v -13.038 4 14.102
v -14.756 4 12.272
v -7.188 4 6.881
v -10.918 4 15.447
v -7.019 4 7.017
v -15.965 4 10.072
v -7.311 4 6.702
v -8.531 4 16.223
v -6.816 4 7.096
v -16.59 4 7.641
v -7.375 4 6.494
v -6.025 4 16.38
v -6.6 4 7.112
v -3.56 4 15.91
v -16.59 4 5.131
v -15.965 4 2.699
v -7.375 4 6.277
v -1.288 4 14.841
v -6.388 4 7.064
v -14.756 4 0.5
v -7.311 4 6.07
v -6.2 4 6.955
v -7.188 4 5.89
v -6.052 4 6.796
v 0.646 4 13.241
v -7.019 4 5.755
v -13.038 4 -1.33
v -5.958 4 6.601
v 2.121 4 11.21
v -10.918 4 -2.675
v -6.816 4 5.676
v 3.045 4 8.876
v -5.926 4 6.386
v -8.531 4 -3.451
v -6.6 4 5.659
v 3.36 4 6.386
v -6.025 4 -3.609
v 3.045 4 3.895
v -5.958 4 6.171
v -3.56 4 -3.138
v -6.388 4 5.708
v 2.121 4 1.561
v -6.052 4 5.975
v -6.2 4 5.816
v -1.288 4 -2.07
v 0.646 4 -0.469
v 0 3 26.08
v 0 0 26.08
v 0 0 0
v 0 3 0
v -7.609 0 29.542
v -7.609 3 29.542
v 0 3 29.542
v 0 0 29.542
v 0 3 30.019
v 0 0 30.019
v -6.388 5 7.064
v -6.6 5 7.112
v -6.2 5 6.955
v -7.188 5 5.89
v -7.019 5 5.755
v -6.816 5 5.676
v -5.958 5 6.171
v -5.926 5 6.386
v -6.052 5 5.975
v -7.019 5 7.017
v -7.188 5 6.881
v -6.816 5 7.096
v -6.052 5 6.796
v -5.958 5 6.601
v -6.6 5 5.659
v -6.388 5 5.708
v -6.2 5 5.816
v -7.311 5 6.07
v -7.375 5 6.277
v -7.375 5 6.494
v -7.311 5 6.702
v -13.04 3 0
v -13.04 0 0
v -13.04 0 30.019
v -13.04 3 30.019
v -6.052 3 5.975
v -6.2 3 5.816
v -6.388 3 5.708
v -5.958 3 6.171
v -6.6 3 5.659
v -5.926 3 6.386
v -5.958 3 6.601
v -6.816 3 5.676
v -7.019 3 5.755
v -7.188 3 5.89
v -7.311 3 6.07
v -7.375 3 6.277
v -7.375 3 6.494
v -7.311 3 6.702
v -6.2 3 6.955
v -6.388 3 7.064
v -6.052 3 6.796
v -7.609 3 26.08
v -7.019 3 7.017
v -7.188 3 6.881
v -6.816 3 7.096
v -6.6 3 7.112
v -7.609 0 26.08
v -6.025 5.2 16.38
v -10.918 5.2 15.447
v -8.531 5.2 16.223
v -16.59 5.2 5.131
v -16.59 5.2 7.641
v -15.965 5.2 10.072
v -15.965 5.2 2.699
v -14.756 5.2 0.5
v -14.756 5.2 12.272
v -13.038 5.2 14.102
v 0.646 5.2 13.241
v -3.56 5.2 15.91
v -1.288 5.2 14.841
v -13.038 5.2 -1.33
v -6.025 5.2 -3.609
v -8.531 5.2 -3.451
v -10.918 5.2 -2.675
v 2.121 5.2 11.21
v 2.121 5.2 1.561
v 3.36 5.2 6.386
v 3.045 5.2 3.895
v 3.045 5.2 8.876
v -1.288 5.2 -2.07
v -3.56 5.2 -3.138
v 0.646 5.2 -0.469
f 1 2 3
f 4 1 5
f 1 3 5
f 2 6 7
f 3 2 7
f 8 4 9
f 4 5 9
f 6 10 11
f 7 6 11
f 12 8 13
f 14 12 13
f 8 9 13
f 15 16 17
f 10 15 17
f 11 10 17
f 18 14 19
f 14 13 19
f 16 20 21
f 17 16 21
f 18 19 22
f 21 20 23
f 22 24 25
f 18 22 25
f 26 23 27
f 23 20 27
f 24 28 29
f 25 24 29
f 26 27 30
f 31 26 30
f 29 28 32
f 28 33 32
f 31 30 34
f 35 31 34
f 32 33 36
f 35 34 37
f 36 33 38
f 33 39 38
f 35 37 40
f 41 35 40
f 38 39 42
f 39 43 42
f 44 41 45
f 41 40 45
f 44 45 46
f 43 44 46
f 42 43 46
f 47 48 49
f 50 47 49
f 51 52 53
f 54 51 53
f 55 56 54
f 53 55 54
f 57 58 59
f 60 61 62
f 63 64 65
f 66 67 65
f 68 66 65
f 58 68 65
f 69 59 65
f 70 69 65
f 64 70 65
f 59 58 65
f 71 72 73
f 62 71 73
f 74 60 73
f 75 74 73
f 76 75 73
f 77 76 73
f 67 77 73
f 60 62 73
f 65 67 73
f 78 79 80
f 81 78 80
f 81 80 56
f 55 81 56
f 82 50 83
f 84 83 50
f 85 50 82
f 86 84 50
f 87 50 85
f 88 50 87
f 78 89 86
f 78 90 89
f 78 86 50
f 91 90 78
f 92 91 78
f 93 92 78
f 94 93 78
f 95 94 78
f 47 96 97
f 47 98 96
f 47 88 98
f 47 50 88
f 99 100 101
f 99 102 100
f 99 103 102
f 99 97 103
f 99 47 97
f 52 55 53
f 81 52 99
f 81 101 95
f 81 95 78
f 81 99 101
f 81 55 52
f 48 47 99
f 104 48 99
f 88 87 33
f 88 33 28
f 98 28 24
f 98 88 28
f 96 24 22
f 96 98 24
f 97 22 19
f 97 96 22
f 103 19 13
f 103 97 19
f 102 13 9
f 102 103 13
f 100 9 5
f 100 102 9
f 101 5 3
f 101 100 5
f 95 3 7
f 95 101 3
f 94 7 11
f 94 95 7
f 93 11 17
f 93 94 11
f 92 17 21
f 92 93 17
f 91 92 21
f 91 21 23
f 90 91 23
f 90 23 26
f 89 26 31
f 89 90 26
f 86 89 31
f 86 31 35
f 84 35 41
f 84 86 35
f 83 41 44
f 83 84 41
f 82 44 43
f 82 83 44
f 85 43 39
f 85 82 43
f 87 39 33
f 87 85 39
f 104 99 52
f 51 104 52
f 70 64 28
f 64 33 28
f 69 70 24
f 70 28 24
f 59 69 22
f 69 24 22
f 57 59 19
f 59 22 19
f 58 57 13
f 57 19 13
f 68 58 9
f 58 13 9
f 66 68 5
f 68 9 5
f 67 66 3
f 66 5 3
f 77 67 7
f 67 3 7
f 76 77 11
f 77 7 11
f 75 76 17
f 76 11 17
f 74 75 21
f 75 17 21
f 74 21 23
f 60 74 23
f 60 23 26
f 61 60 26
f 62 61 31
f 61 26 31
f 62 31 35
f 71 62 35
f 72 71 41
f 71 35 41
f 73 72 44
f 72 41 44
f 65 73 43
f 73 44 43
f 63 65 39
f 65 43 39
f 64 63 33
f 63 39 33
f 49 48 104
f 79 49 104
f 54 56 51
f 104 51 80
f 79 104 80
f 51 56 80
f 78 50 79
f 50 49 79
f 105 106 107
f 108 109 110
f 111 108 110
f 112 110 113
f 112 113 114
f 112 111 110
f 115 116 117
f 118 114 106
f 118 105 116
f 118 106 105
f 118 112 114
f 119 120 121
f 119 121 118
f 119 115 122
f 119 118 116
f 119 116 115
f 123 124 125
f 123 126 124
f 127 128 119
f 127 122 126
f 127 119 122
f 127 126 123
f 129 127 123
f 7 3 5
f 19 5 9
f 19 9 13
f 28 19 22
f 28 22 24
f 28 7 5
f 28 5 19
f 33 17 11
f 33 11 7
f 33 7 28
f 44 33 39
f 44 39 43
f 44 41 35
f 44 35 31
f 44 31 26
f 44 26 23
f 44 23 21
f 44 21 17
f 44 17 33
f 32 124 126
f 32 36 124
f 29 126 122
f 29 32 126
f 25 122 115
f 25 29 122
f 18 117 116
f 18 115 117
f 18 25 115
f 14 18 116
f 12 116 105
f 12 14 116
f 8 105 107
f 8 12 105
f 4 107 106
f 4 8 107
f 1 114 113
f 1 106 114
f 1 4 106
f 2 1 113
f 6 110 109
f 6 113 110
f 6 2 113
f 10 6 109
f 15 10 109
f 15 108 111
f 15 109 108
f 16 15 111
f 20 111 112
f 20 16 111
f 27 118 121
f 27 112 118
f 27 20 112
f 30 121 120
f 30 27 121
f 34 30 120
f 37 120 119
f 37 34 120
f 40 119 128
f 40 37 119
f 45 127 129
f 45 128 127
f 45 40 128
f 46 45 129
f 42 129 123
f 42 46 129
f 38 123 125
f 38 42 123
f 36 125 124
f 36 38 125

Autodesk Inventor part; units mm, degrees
ref_plane "YZ Plane" through (0, 0, 0) normal (1, 0, 0) x (0, 1, 0)
ref_plane "XZ Plane" through (0, 0, 0) normal (0, 1, 0) x (-1, 0, 0)
ref_plane "XY Plane" through (0, 0, 0) normal (0, 0, 1) x (1, 0, 0)
sketch "Sketch1" plane through (0, 0, 0) normal (0, 1, 0) x (-1, 0, 0)
  line L0 (0, 0) -> (13.0401, 0)
  line L1 (13.0401, 0) -> (13.0401, 30.019)
  line L2 (13.0401, 30.019) -> (0, 30.019)
  line L3 (0, 30.019) -> (0, 0)
extrude "Extrusion1" add sketch "Sketch1" along normal blind 3
sketch "Sketch2" plane through (0, 3, 0) normal (0, 1, 0) x (1, 0, 0)
  circle A0 centre (-6.6543, -6.3858) radius 0.7285
  point P0 (0, 0)
extrude "Extrusion2" add sketch "Sketch2" along normal blind 1
sketch "Sketch3" plane through (-6.6543, 4, 6.3858) normal (0, 1, 0) x (1, 0, 0)
  point P0 (6.6543, 6.3858)
sketch "Sketch4" plane through (-6.6543, 4, 6.3858) normal (0, 1, 0) x (1, 0, 0)
  circle A0 centre (0, 0) radius 0.7285 projected
  circle A1 centre (0, 0) radius 10.0143
  point P0 (6.6543, 6.3858)
extrude "Extrusion3" add sketch "Sketch4" along normal blind 1
sketch "Sketch5" plane through (0, 0, 30.019) normal (1, 0, 0) x (0, 0, -1)
  point P0 (30.019, 0)
sketch "Sketch6" plane through (0, 3, 0) normal (0, 1, 0) x (1, 0, 0)
  line L0 (0, -30.019) -> (0, 0) projected
  line L1 (0, -28.1093) -> (-7.3705, -28.1093)
  line L2 (-7.3705, -28.1093) -> (-7.3705, -24.1704)
  line L3 (-7.3705, -24.1704) -> (0, -24.1704)
  line L4 (0, -24.1704) -> (0, -28.1093)
extrude "Extrusion4" add sketch "Sketch6" against normal blind 1
sketch "Sketch7" plane through (0, 3, 0) normal (0, 1, 0) x (1, 0, 0)
  line L0 (0, -30.019) -> (0, 0) projected
  line L1 (0, -26.0801) -> (-7.6092, -26.0801)
  line L2 (-7.6092, -26.0801) -> (-7.6092, -29.5416)
  line L3 (-7.6092, -29.5416) -> (0, -29.5416)
  line L4 (0, -29.5416) -> (0, -26.0801)
extrude "Extrusion5" cut sketch "Sketch7" against normal blind 3
sketch "Sketch8" plane through (-6.6543, 5, 6.3858) normal (0, 1, 0) x (1, 0, 0)
  circle A0 centre (0, 0) radius 10.0143 projected
  line L0 (-6.3858, -23.6333) -> (6.6543, -23.6333) projected
  point P0 (6.6543, 6.3858)
sketch "Sketch9" plane through (-6.6543, 5, 6.3858) normal (0, 1, 0) x (1, 0, 0)
  point P0 (6.6543, 6.3858)
extrude "Extrusion6" add sketch "Sketch8" along normal blind 0.2
sketch "Sketch10" plane through (-6.6543, 5.2, 6.3858) normal (0, 1, 0) x (1, 0, 0)
  circle A0 centre (0, 0) radius 10.0143 projected
  line L0 (-9.1289, -4.117) -> (1.0146, -22.6784)
  line L1 (1.0146, -22.6784) -> (9.9069, -2.4469)
  point P0 (6.6543, 6.3858)
